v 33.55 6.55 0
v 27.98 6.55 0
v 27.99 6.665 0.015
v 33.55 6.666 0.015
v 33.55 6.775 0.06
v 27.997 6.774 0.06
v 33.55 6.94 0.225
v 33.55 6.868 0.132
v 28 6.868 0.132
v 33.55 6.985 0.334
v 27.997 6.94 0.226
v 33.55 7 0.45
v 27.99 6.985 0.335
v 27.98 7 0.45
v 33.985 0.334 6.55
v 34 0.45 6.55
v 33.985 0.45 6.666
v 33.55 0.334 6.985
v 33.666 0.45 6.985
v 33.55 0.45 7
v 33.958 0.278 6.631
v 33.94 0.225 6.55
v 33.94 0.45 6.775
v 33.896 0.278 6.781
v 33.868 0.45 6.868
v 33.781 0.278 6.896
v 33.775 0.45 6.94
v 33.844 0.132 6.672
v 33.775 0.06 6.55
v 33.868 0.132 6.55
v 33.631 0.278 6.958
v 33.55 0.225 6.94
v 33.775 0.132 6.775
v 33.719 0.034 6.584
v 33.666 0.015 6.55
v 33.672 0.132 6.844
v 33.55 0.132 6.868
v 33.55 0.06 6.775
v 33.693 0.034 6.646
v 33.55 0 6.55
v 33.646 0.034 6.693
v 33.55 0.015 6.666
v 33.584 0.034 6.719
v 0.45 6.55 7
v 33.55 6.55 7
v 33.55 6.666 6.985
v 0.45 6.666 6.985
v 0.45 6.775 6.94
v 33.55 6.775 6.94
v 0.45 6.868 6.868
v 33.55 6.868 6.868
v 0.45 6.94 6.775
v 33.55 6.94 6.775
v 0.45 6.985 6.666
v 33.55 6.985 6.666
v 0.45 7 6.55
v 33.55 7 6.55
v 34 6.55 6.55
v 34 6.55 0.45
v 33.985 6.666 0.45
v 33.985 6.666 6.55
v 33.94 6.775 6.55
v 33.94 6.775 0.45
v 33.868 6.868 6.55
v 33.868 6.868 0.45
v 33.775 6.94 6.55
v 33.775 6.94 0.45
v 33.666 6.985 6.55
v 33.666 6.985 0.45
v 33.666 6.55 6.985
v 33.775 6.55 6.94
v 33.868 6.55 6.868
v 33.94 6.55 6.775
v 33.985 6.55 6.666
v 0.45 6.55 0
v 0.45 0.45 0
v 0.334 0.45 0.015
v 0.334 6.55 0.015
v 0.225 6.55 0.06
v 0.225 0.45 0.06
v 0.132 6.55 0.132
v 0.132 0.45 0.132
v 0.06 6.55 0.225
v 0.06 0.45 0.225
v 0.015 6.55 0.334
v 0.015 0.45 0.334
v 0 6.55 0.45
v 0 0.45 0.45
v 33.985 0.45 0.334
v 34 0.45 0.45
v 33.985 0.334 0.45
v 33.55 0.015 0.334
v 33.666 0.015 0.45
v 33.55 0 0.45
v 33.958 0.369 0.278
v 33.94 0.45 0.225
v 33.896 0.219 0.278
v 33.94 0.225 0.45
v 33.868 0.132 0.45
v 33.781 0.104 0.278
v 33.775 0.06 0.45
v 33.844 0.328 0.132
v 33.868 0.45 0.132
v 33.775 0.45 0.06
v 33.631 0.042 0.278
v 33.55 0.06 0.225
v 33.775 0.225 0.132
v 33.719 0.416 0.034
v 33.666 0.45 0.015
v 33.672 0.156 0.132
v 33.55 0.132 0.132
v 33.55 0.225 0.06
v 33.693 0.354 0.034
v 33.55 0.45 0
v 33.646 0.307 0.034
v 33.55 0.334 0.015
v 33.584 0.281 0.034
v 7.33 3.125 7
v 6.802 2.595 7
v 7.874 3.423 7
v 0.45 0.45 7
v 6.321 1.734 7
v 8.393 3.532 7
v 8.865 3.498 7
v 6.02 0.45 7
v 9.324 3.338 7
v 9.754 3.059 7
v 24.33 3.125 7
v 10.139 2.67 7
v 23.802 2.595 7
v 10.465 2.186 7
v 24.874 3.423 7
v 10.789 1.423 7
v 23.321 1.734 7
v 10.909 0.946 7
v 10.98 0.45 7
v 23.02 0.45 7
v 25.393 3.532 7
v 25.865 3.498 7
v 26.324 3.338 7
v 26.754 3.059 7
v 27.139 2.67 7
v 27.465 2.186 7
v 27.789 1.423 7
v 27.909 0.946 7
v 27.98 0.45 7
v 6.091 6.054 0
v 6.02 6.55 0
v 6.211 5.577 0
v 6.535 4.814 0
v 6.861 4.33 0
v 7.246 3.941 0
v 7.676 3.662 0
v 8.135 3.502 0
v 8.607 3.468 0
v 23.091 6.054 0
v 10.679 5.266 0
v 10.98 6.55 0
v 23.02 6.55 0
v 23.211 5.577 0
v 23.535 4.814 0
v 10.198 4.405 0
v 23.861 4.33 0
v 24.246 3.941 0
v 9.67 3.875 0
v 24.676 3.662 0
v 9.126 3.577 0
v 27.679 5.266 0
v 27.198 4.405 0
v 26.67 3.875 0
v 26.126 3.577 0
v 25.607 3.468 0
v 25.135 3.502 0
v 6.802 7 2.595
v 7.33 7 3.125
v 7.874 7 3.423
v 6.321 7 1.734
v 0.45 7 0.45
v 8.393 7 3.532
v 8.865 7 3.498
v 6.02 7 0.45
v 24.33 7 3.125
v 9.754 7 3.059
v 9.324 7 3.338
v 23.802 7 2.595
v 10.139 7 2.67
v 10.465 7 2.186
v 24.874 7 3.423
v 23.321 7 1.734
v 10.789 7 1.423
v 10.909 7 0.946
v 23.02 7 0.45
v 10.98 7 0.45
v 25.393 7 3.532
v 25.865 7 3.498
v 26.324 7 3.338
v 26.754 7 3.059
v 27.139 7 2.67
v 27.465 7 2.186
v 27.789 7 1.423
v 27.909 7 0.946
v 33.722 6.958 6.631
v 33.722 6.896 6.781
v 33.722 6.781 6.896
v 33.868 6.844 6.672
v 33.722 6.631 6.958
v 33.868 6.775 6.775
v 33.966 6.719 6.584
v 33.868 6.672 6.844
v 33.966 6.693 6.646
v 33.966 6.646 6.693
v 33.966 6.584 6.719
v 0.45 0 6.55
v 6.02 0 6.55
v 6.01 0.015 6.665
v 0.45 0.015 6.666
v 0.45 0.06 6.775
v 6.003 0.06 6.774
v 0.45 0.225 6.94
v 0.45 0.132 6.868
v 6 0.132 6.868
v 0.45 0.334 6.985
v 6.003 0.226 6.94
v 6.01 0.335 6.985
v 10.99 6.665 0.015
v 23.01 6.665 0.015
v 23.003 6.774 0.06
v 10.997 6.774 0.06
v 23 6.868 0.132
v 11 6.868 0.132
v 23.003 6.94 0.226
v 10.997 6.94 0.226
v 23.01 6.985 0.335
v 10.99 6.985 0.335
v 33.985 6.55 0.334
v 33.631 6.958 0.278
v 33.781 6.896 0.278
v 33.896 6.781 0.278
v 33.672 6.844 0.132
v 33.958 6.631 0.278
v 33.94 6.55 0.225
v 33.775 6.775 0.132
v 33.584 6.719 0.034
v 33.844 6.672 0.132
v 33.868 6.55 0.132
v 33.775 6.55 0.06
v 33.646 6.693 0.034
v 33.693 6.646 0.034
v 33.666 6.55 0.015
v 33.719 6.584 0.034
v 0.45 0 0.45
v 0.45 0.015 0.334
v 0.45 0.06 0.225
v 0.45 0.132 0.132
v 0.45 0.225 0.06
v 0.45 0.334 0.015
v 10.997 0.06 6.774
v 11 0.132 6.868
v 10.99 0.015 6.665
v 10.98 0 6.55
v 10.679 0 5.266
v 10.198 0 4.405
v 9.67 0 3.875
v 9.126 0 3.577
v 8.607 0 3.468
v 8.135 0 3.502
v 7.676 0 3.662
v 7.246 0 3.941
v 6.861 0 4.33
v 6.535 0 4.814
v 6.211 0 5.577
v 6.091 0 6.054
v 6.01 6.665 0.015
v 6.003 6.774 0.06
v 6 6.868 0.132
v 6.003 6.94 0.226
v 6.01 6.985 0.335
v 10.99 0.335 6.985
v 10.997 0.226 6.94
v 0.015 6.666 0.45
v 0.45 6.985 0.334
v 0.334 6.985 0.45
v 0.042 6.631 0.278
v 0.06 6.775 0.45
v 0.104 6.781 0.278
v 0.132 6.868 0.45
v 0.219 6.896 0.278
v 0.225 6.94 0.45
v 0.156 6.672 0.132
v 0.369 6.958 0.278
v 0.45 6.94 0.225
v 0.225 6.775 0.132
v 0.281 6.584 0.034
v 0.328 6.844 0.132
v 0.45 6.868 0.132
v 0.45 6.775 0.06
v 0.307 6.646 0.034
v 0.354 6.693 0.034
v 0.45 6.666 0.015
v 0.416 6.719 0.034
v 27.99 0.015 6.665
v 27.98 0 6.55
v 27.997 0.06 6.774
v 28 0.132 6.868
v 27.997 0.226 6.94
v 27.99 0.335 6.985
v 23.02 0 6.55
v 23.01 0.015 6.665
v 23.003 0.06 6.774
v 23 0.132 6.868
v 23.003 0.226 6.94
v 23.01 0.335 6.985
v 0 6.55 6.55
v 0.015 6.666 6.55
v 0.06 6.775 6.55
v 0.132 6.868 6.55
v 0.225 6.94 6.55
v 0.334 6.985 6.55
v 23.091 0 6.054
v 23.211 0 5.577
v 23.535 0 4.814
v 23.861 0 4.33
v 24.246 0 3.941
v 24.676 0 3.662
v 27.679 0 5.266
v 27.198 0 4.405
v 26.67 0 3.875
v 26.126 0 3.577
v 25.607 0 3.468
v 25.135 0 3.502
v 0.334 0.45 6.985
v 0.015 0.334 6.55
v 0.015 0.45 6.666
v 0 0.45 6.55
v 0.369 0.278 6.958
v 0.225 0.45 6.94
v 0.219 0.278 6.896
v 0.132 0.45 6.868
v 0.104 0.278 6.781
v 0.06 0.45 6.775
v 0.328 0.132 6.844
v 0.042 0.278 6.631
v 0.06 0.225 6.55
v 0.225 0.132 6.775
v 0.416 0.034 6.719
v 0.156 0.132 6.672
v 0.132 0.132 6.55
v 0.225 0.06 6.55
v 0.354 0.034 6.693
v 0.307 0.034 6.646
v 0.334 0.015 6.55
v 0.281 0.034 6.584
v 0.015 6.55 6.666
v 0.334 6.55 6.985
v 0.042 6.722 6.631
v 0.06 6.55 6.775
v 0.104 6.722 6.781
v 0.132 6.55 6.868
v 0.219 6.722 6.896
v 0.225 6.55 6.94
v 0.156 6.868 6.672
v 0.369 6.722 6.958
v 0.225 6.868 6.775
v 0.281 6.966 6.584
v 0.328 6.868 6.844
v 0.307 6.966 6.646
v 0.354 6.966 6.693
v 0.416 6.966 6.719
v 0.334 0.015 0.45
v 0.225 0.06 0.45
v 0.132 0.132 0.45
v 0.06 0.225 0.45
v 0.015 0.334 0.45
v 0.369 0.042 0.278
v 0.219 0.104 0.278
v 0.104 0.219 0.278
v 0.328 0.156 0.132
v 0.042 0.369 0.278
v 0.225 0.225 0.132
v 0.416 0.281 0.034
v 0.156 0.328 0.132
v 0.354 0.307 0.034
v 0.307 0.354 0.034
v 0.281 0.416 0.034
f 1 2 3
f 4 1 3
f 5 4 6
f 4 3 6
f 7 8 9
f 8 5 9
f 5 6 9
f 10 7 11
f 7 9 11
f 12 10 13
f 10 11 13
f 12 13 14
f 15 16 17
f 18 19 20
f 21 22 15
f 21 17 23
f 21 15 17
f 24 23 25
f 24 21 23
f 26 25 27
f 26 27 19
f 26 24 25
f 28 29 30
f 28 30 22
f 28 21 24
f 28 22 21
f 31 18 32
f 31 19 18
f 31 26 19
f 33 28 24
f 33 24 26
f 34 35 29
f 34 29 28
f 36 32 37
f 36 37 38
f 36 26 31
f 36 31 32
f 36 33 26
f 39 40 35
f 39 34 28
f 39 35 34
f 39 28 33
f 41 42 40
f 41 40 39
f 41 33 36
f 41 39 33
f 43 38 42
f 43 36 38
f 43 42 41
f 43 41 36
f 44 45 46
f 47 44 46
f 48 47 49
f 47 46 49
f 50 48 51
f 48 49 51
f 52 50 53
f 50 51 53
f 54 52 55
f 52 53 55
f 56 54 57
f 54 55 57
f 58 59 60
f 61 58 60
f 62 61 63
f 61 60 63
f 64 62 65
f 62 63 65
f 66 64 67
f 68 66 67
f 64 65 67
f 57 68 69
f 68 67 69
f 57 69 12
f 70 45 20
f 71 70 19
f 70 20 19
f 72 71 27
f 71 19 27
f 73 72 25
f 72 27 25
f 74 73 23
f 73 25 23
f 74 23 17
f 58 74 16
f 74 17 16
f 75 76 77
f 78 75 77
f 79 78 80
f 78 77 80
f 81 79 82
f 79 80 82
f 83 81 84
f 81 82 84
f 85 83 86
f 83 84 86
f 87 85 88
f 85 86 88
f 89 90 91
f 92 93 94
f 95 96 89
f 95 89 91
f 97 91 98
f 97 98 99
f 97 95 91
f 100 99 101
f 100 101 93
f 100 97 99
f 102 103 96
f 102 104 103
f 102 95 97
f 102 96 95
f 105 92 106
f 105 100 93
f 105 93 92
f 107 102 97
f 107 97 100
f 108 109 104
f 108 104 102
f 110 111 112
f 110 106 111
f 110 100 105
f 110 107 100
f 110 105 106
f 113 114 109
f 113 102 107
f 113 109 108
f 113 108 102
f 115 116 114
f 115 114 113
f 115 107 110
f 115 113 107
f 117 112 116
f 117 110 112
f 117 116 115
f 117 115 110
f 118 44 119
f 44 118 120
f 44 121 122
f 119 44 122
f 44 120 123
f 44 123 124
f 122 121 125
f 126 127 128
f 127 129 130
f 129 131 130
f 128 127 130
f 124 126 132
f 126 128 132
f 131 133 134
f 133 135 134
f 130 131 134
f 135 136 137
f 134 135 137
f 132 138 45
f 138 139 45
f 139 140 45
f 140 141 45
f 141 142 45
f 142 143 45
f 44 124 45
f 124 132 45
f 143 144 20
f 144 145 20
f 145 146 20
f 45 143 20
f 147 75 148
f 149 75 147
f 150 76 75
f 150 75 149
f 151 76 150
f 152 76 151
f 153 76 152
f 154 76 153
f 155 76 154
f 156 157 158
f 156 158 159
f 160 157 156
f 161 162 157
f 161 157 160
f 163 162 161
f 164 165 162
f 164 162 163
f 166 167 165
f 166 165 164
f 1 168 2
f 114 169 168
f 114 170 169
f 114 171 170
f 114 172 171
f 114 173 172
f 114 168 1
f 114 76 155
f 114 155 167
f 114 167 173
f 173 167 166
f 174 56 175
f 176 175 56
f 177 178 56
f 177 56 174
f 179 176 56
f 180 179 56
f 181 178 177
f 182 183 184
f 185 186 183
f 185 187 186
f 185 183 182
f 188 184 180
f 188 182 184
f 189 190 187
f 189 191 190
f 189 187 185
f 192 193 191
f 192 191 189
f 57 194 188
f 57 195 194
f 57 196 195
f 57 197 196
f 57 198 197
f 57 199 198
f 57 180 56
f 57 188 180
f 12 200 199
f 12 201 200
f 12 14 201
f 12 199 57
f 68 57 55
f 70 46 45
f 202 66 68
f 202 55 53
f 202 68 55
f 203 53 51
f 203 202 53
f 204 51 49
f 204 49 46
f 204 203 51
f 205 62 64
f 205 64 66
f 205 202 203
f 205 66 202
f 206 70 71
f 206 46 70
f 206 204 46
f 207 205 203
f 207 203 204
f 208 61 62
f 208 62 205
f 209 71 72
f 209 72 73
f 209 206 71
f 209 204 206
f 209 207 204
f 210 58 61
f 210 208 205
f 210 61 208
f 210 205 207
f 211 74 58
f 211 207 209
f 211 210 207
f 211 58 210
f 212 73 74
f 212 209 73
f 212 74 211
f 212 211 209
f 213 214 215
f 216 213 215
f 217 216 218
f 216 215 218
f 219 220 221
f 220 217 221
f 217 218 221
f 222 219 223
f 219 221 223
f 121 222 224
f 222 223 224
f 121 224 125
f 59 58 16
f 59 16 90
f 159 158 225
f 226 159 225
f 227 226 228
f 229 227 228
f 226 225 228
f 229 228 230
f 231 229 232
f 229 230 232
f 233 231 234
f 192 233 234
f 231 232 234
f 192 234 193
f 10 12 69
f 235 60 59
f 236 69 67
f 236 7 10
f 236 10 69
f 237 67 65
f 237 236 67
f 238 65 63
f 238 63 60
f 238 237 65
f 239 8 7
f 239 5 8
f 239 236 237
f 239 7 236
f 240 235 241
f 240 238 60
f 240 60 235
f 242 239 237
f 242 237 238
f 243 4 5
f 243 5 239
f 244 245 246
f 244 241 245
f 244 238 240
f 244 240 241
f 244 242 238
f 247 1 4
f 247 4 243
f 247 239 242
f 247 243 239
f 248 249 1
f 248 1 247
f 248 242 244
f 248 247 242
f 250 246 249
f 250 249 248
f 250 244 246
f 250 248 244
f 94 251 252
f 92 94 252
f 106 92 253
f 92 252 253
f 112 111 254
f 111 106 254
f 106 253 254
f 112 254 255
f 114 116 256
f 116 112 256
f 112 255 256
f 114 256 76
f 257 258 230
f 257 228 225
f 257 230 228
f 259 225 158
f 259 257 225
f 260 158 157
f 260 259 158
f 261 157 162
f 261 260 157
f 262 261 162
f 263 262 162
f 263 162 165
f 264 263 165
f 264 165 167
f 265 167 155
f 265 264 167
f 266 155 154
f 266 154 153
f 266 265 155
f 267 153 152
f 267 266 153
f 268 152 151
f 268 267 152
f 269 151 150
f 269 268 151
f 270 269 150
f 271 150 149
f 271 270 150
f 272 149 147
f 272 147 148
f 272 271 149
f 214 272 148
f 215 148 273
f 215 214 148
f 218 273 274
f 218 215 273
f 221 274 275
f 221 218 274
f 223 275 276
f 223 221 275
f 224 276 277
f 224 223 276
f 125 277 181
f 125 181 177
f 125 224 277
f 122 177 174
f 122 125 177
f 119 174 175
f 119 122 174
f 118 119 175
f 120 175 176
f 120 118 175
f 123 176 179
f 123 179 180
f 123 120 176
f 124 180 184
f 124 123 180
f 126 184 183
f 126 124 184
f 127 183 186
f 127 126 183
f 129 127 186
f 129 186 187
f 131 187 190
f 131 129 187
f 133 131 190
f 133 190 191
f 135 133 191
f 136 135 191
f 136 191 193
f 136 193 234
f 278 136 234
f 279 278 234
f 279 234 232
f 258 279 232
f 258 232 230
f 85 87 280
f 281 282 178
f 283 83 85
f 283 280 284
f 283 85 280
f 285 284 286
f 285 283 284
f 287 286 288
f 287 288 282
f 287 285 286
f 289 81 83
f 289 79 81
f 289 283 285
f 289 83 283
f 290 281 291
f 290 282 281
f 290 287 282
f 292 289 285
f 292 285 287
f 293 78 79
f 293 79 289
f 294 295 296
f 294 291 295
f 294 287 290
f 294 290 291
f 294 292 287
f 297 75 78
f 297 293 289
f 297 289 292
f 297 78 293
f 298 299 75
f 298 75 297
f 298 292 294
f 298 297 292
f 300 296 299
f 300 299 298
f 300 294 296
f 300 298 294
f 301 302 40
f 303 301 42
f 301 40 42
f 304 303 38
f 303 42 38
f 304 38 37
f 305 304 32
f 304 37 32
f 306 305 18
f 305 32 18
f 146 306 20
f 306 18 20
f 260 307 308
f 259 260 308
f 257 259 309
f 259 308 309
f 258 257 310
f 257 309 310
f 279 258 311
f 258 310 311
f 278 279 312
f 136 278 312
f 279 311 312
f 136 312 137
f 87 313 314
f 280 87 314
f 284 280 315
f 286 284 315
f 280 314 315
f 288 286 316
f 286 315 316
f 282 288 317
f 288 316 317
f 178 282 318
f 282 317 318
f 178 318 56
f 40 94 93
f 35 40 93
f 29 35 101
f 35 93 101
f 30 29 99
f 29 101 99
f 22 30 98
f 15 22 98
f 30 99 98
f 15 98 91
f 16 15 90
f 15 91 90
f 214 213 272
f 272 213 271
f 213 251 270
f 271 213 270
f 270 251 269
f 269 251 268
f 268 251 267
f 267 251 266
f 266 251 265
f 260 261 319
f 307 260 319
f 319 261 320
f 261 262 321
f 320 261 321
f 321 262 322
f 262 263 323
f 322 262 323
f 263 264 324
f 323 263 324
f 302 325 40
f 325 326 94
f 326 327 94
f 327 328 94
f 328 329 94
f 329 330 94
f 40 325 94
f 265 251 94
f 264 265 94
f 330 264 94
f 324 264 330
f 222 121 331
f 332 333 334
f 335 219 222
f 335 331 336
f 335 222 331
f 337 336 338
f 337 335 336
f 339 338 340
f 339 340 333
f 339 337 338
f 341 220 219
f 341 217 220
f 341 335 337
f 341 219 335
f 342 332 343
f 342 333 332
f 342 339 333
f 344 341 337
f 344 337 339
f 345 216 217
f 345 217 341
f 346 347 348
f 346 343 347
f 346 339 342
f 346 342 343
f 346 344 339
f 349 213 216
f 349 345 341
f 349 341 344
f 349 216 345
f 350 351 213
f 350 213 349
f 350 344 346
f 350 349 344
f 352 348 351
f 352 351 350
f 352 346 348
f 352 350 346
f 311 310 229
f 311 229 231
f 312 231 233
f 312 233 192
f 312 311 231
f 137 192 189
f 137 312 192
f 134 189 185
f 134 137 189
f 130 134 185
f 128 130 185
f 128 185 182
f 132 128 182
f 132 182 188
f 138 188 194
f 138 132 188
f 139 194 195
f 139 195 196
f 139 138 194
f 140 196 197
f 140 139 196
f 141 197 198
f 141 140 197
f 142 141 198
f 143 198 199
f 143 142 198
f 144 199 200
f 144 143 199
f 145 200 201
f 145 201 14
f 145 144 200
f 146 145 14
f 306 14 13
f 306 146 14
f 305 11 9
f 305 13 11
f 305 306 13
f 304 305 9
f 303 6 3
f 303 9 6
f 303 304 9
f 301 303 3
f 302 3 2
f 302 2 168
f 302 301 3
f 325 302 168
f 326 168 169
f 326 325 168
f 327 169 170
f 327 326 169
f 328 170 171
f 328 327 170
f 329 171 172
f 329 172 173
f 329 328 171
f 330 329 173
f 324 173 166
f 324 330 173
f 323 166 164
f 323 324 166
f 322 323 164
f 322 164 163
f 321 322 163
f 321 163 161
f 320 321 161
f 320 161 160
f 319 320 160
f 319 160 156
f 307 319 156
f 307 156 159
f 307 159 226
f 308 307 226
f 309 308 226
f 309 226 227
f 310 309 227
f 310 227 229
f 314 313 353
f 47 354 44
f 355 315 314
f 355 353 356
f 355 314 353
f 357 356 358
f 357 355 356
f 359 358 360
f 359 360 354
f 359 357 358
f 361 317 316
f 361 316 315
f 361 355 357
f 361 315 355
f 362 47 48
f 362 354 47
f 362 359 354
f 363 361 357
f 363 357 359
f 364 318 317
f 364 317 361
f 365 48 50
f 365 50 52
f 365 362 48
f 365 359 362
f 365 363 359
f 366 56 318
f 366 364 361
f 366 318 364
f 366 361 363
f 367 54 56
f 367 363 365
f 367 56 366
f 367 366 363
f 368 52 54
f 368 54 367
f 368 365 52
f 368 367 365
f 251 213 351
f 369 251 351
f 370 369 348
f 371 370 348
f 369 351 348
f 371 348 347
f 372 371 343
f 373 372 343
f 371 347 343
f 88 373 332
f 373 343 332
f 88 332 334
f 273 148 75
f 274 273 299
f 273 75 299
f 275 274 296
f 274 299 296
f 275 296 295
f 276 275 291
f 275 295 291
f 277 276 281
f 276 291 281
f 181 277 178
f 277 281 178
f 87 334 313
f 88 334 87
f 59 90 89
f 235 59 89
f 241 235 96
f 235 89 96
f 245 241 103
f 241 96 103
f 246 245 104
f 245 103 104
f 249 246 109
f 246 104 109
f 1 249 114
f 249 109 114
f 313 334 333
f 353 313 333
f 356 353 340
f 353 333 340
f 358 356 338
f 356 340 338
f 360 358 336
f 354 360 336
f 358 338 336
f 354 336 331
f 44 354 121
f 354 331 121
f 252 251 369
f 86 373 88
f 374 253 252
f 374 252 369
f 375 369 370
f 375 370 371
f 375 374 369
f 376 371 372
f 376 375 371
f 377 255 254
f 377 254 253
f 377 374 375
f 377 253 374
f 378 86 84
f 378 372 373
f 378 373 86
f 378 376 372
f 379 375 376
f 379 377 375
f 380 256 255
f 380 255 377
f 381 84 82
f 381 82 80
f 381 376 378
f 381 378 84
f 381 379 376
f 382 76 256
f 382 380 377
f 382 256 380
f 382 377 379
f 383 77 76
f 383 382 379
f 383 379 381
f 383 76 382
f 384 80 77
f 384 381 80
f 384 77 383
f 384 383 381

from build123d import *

# Parameters (mm, degrees)
SKETCH1_W               = 34
SKETCH1_H               = 7
BOSS_EXTRUDE1_DEPTH     = 7
CUT_EXTRUDE2_DEPTH      = 36.411862419
CUT_EXTRUDE2_DEPTH_BACK = 36.411862419
SKETCH6_OUTSIDE_W       = 43.082
SKETCH6_OUTSIDE_H       = 18.981
SKETCH6_OUTSIDE_W_2     = 34
SKETCH6_OUTSIDE_H_2     = 9.899494937
SKETCH6_OUTSIDE_R       = 2.5
FILLET1_R               = 0.45


with BuildPart() as part:
    # sketch1 → Boss-Extrude1 (new body)
    with BuildSketch(Plane(origin=(0, 0, 0), x_dir=(1, 0, 0), z_dir=(0, 1, 0))):
        with Locations((17, -3.5)):
            Rectangle(SKETCH1_W, SKETCH1_H)
    extrude(amount=BOSS_EXTRUDE1_DEPTH)

    # Sketch6 outside → Cut-Extrude2 (cut, two sides: drawn at the far end of the back side and taken through both)
    # profile 1 of 3: a face of its own
    with BuildSketch(Plane(origin=(0, 0, 0), x_dir=(-1, 0, 0), z_dir=(0, 0.7071067811865475, -0.7071067811865477)).offset(-CUT_EXTRUDE2_DEPTH_BACK)):
        with Locations((-17, 4.9495)):
            Rectangle(SKETCH6_OUTSIDE_W, SKETCH6_OUTSIDE_H)
        with Locations((-17, 4.949747469)):
            Rectangle(SKETCH6_OUTSIDE_W_2, SKETCH6_OUTSIDE_H_2, mode=Mode.SUBTRACT)
    # profile 2 of 3: a face of its own
    with BuildSketch(Plane(origin=(0, 0, 0), x_dir=(-1, 0, 0), z_dir=(0, 0.7071067811865475, -0.7071067811865477)).offset(-CUT_EXTRUDE2_DEPTH_BACK)):
        with Locations((-25.5, 4.949747468)):
            Circle(SKETCH6_OUTSIDE_R)
    # profile 3 of 3: a face of its own
    with BuildSketch(Plane(origin=(0, 0, 0), x_dir=(-1, 0, 0), z_dir=(0, 0.7071067811865475, -0.7071067811865477)).offset(-CUT_EXTRUDE2_DEPTH_BACK)):
        with Locations(Location((-8.5, 4.949747468, 0), (0, 0, 180))):
            Circle(SKETCH6_OUTSIDE_R)
    extrude(amount=CUT_EXTRUDE2_DEPTH + CUT_EXTRUDE2_DEPTH_BACK, mode=Mode.SUBTRACT)

    # Fillet1
    # the kernel refuses this fillet: 0.45 mm, written as the material it takes off along each edge
    with BuildSketch(Plane(origin=(33.55, 6.55, 0.45), x_dir=(1, 0, 0), z_dir=(0, 0, -1))) as fillet1_piece_1_section:
        Polygon((0, 0), (FILLET1_R, 0), (FILLET1_R, -FILLET1_R), (0, -FILLET1_R), align=None)
    fillet1_piece_1 = extrude(amount=FILLET1_R, mode=Mode.PRIVATE)
    fillet1_piece_1 = fillet1_piece_1 - Plane(origin=(33.55, 6.55, 0.45), x_dir=(-0.7071067811865475, -0.7071067811865475, 0), z_dir=(0, 0, -1)) * Sphere(FILLET1_R, mode=Mode.PRIVATE)
    add(fillet1_piece_1, mode=Mode.SUBTRACT)
    with BuildSketch(Plane(origin=(0.45, 6.55, 0.45), x_dir=(0, 1, 0), z_dir=(0, 0, -1))) as fillet1_piece_2_section:
        Polygon((0, 0), (FILLET1_R, 0), (FILLET1_R, -FILLET1_R), (0, -FILLET1_R), align=None)
    fillet1_piece_2 = extrude(amount=FILLET1_R, mode=Mode.PRIVATE)
    fillet1_piece_2 = fillet1_piece_2 - Plane(origin=(0.45, 6.55, 0.45), x_dir=(0.7071067811865475, -0.7071067811865475, 0), z_dir=(0, 0, -1)) * Sphere(FILLET1_R, mode=Mode.PRIVATE)
    add(fillet1_piece_2, mode=Mode.SUBTRACT)
    with BuildSketch(Plane(origin=(33.55, 0.45, 0.45), x_dir=(0, -1, 0), z_dir=(0, 0, -1))) as fillet1_piece_3_section:
        Polygon((0, 0), (FILLET1_R, 0), (FILLET1_R, -FILLET1_R), (0, -FILLET1_R), align=None)
    fillet1_piece_3 = extrude(amount=FILLET1_R, mode=Mode.PRIVATE)
    fillet1_piece_3 = fillet1_piece_3 - Plane(origin=(33.55, 0.45, 0.45), x_dir=(-0.7071067811865475, 0.7071067811865475, 0), z_dir=(0, 0, -1)) * Sphere(FILLET1_R, mode=Mode.PRIVATE)
    add(fillet1_piece_3, mode=Mode.SUBTRACT)
    with BuildSketch(Plane(origin=(33.55, 0.45, 6.55), x_dir=(1, 0, 0), z_dir=(0, -1, 0))) as fillet1_piece_4_section:
        Polygon((0, 0), (FILLET1_R, 0), (FILLET1_R, FILLET1_R), (0, FILLET1_R), align=None)
    fillet1_piece_4 = extrude(amount=FILLET1_R, mode=Mode.PRIVATE)
    fillet1_piece_4 = fillet1_piece_4 - Plane(origin=(33.55, 0.45, 6.55), x_dir=(-0.7071067811865475, 0, -0.7071067811865475), z_dir=(0, -1, 0)) * Sphere(FILLET1_R, mode=Mode.PRIVATE)
    add(fillet1_piece_4, mode=Mode.SUBTRACT)
    with BuildSketch(Plane(origin=(33.55, 6.55, 6.55), x_dir=(0, 1, 0), z_dir=(1, 0, 0))) as fillet1_piece_5_section:
        Polygon((0, 0), (FILLET1_R, 0), (FILLET1_R, FILLET1_R), (0, FILLET1_R), align=None)
    fillet1_piece_5 = extrude(amount=FILLET1_R, mode=Mode.PRIVATE)
    fillet1_piece_5 = fillet1_piece_5 - Plane(origin=(33.55, 6.55, 6.55), x_dir=(0, -0.7071067811865475, -0.7071067811865475), z_dir=(1, 0, 0)) * Sphere(FILLET1_R, mode=Mode.PRIVATE)
    add(fillet1_piece_5, mode=Mode.SUBTRACT)
    with BuildSketch(Plane(origin=(0.45, 0.45, 6.55), x_dir=(-1, 0, 0), z_dir=(0, -1, 0))) as fillet1_piece_6_section:
        Polygon((0, 0), (FILLET1_R, 0), (FILLET1_R, -FILLET1_R), (0, -FILLET1_R), align=None)
    fillet1_piece_6 = extrude(amount=FILLET1_R, mode=Mode.PRIVATE)
    fillet1_piece_6 = fillet1_piece_6 - Plane(origin=(0.45, 0.45, 6.55), x_dir=(0.7071067811865475, 0, -0.7071067811865477), z_dir=(0, -1, 0)) * Sphere(FILLET1_R, mode=Mode.PRIVATE)
    add(fillet1_piece_6, mode=Mode.SUBTRACT)
    with BuildSketch(Plane(origin=(0.45, 0.45, 0.45), x_dir=(0, -1, 0), z_dir=(0, 0, -1))) as fillet1_piece_7_section:
        Polygon((0, 0), (FILLET1_R, 0), (FILLET1_R, FILLET1_R), (0, FILLET1_R), align=None)
    fillet1_piece_7 = extrude(amount=FILLET1_R, mode=Mode.PRIVATE)
    fillet1_piece_7 = fillet1_piece_7 - Plane(origin=(0.45, 0.45, 0.45), x_dir=(0.7071067811865475, 0.7071067811865475, 0), z_dir=(0, 0, -1)) * Sphere(FILLET1_R, mode=Mode.PRIVATE)
    add(fillet1_piece_7, mode=Mode.SUBTRACT)
    with BuildSketch(Plane(origin=(0.45, 6.55, 6.55), x_dir=(-1, 0, 0), z_dir=(0, 1, 0))) as fillet1_piece_8_section:
        Polygon((0, 0), (FILLET1_R, 0), (FILLET1_R, FILLET1_R), (0, FILLET1_R), align=None)
    fillet1_piece_8 = extrude(amount=FILLET1_R, mode=Mode.PRIVATE)
    fillet1_piece_8 = fillet1_piece_8 - Plane(origin=(0.45, 6.55, 6.55), x_dir=(0.7071067811865475, 0, -0.7071067811865477), z_dir=(0, 1, 0)) * Sphere(FILLET1_R, mode=Mode.PRIVATE)
    add(fillet1_piece_8, mode=Mode.SUBTRACT)
    with BuildSketch(Plane(origin=(26.875, 7, 0), x_dir=(0, -1, 0), z_dir=(1, 0, 0)), Plane(origin=(0.45, 7, 0), x_dir=(0, -1, 0), z_dir=(1, 0, 0)), Plane(origin=(33.55, 0, 7), x_dir=(0, 0, -1), z_dir=(-1, 0, 0)), Plane(origin=(7.125, 0, 7), x_dir=(0, 0, -1), z_dir=(-1, 0, 0))) as fillet1_piece_9:
        with BuildLine():
            CenterArc((FILLET1_R, -FILLET1_R), FILLET1_R, 90, 90)
            Line((0, -FILLET1_R), (0, 0))
            Line((0, 0), (FILLET1_R, 0))
        make_face()
    extrude(amount=6.675, mode=Mode.SUBTRACT)
    with BuildSketch(Plane(origin=(9.875, 7, 0), x_dir=(0, -1, 0), z_dir=(1, 0, 0)), Plane(origin=(24.125, 0, 7), x_dir=(0, 0, -1), z_dir=(-1, 0, 0))) as fillet1_piece_10:
        with BuildLine():
            CenterArc((FILLET1_R, -FILLET1_R), FILLET1_R, 90, 90)
            Line((0, -FILLET1_R), (0, 0))
            Line((0, 0), (FILLET1_R, 0))
        make_face()
    extrude(amount=14.25, mode=Mode.SUBTRACT)
    with BuildSketch(Plane(origin=(34, 0, 0.45), x_dir=(-1, 0, 0), z_dir=(0, 0, 1)), Plane(origin=(34, 7, 0.45), x_dir=(0, -1, 0), z_dir=(0, 0, 1)), Plane(origin=(0, 0.45, 0), x_dir=(1, 0, 0), z_dir=(0, 1, 0)), Plane(origin=(0, 0.45, 7), x_dir=(0, 0, -1), z_dir=(0, 1, 0)), Plane(origin=(0, 0, 6.55), x_dir=(1, 0, 0), z_dir=(0, 0, -1))) as fillet1_piece_11:
        with BuildLine():
            CenterArc((FILLET1_R, -FILLET1_R), FILLET1_R, 90, 90)
            Line((0, -FILLET1_R), (0, 0))
            Line((0, 0), (FILLET1_R, 0))
        make_face()
    extrude(amount=6.1, mode=Mode.SUBTRACT)
    with BuildSketch(Plane(origin=(34, 0.45, 0), x_dir=(-1, 0, 0), z_dir=(0, 1, 0)), Plane(origin=(34, 0.45, 7), x_dir=(0, 0, -1), z_dir=(0, 1, 0)), Plane(origin=(0, 7, 6.55), x_dir=(1, 0, 0), z_dir=(0, 0, -1))) as fillet1_piece_12:
        with BuildLine():
            CenterArc((FILLET1_R, FILLET1_R), FILLET1_R, 180, 90)
            Line((0, FILLET1_R), (0, 0))
            Line((0, 0), (FILLET1_R, 0))
        make_face()
    extrude(amount=6.1, mode=Mode.SUBTRACT)
    with BuildSketch(Plane(origin=(0.45, 0, 0), x_dir=(0, 1, 0), z_dir=(1, 0, 0)), Plane(origin=(33.55, 7, 7), x_dir=(0, 0, -1), z_dir=(-1, 0, 0))) as fillet1_piece_13:
        with BuildLine():
            CenterArc((FILLET1_R, FILLET1_R), FILLET1_R, 180, 90)
            Line((0, FILLET1_R), (0, 0))
            Line((0, 0), (FILLET1_R, 0))
        make_face()
    extrude(amount=33.1, mode=Mode.SUBTRACT)


solid = part.part
